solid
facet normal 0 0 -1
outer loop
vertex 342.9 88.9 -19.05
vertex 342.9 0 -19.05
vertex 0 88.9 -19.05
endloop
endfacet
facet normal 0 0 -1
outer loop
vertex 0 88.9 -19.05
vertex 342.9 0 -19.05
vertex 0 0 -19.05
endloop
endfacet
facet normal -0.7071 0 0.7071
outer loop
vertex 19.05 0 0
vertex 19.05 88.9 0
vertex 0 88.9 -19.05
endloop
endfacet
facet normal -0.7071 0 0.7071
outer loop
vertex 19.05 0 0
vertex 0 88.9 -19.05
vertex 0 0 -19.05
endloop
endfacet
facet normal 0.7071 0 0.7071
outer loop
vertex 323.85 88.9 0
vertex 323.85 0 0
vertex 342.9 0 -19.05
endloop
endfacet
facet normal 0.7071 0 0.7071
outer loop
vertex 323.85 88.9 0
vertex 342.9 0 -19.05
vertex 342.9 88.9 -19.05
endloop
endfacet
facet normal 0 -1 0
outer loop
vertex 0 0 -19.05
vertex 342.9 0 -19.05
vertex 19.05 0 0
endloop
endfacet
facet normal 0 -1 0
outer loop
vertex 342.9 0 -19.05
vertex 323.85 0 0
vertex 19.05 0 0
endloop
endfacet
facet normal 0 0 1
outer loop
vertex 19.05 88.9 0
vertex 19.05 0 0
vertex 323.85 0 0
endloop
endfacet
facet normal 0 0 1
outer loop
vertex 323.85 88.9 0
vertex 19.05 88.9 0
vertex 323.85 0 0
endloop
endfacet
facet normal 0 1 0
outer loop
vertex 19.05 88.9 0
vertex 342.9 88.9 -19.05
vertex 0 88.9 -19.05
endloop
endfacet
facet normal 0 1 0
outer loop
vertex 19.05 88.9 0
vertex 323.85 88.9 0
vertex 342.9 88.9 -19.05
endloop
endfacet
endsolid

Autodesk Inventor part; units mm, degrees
ref_plane "YZ Plane" through (0, 0, 0) normal (1, 0, 0) x (0, 1, 0)
ref_plane "XZ Plane" through (0, 0, 0) normal (0, 1, 0) x (-1, 0, 0)
ref_plane "XY Plane" through (0, 0, 0) normal (0, 0, 1) x (1, 0, 0)
sketch "Sketch1" plane through (0, 0, 0) normal (0, 1, 0) x (-1, 0, 0)
  line L0 (0, 0) -> (-342.9, 0)
  line L1 (-342.9, 0) -> (-342.9, -19.05)
  line L2 (-342.9, -19.05) -> (0, -19.05)
  line L3 (0, -19.05) -> (0, 0)
  dimension "d0" = 342.9
  dimension "d1" = 19.05
extrude "Extrusion1" add sketch "Sketch1" along normal blind 88.9
chamfer "Chamfer1" distance 19.05 angle 45 2 edges at (342.9, 44.45, 0) (0, 44.45, 0)
properties part number "piece"
